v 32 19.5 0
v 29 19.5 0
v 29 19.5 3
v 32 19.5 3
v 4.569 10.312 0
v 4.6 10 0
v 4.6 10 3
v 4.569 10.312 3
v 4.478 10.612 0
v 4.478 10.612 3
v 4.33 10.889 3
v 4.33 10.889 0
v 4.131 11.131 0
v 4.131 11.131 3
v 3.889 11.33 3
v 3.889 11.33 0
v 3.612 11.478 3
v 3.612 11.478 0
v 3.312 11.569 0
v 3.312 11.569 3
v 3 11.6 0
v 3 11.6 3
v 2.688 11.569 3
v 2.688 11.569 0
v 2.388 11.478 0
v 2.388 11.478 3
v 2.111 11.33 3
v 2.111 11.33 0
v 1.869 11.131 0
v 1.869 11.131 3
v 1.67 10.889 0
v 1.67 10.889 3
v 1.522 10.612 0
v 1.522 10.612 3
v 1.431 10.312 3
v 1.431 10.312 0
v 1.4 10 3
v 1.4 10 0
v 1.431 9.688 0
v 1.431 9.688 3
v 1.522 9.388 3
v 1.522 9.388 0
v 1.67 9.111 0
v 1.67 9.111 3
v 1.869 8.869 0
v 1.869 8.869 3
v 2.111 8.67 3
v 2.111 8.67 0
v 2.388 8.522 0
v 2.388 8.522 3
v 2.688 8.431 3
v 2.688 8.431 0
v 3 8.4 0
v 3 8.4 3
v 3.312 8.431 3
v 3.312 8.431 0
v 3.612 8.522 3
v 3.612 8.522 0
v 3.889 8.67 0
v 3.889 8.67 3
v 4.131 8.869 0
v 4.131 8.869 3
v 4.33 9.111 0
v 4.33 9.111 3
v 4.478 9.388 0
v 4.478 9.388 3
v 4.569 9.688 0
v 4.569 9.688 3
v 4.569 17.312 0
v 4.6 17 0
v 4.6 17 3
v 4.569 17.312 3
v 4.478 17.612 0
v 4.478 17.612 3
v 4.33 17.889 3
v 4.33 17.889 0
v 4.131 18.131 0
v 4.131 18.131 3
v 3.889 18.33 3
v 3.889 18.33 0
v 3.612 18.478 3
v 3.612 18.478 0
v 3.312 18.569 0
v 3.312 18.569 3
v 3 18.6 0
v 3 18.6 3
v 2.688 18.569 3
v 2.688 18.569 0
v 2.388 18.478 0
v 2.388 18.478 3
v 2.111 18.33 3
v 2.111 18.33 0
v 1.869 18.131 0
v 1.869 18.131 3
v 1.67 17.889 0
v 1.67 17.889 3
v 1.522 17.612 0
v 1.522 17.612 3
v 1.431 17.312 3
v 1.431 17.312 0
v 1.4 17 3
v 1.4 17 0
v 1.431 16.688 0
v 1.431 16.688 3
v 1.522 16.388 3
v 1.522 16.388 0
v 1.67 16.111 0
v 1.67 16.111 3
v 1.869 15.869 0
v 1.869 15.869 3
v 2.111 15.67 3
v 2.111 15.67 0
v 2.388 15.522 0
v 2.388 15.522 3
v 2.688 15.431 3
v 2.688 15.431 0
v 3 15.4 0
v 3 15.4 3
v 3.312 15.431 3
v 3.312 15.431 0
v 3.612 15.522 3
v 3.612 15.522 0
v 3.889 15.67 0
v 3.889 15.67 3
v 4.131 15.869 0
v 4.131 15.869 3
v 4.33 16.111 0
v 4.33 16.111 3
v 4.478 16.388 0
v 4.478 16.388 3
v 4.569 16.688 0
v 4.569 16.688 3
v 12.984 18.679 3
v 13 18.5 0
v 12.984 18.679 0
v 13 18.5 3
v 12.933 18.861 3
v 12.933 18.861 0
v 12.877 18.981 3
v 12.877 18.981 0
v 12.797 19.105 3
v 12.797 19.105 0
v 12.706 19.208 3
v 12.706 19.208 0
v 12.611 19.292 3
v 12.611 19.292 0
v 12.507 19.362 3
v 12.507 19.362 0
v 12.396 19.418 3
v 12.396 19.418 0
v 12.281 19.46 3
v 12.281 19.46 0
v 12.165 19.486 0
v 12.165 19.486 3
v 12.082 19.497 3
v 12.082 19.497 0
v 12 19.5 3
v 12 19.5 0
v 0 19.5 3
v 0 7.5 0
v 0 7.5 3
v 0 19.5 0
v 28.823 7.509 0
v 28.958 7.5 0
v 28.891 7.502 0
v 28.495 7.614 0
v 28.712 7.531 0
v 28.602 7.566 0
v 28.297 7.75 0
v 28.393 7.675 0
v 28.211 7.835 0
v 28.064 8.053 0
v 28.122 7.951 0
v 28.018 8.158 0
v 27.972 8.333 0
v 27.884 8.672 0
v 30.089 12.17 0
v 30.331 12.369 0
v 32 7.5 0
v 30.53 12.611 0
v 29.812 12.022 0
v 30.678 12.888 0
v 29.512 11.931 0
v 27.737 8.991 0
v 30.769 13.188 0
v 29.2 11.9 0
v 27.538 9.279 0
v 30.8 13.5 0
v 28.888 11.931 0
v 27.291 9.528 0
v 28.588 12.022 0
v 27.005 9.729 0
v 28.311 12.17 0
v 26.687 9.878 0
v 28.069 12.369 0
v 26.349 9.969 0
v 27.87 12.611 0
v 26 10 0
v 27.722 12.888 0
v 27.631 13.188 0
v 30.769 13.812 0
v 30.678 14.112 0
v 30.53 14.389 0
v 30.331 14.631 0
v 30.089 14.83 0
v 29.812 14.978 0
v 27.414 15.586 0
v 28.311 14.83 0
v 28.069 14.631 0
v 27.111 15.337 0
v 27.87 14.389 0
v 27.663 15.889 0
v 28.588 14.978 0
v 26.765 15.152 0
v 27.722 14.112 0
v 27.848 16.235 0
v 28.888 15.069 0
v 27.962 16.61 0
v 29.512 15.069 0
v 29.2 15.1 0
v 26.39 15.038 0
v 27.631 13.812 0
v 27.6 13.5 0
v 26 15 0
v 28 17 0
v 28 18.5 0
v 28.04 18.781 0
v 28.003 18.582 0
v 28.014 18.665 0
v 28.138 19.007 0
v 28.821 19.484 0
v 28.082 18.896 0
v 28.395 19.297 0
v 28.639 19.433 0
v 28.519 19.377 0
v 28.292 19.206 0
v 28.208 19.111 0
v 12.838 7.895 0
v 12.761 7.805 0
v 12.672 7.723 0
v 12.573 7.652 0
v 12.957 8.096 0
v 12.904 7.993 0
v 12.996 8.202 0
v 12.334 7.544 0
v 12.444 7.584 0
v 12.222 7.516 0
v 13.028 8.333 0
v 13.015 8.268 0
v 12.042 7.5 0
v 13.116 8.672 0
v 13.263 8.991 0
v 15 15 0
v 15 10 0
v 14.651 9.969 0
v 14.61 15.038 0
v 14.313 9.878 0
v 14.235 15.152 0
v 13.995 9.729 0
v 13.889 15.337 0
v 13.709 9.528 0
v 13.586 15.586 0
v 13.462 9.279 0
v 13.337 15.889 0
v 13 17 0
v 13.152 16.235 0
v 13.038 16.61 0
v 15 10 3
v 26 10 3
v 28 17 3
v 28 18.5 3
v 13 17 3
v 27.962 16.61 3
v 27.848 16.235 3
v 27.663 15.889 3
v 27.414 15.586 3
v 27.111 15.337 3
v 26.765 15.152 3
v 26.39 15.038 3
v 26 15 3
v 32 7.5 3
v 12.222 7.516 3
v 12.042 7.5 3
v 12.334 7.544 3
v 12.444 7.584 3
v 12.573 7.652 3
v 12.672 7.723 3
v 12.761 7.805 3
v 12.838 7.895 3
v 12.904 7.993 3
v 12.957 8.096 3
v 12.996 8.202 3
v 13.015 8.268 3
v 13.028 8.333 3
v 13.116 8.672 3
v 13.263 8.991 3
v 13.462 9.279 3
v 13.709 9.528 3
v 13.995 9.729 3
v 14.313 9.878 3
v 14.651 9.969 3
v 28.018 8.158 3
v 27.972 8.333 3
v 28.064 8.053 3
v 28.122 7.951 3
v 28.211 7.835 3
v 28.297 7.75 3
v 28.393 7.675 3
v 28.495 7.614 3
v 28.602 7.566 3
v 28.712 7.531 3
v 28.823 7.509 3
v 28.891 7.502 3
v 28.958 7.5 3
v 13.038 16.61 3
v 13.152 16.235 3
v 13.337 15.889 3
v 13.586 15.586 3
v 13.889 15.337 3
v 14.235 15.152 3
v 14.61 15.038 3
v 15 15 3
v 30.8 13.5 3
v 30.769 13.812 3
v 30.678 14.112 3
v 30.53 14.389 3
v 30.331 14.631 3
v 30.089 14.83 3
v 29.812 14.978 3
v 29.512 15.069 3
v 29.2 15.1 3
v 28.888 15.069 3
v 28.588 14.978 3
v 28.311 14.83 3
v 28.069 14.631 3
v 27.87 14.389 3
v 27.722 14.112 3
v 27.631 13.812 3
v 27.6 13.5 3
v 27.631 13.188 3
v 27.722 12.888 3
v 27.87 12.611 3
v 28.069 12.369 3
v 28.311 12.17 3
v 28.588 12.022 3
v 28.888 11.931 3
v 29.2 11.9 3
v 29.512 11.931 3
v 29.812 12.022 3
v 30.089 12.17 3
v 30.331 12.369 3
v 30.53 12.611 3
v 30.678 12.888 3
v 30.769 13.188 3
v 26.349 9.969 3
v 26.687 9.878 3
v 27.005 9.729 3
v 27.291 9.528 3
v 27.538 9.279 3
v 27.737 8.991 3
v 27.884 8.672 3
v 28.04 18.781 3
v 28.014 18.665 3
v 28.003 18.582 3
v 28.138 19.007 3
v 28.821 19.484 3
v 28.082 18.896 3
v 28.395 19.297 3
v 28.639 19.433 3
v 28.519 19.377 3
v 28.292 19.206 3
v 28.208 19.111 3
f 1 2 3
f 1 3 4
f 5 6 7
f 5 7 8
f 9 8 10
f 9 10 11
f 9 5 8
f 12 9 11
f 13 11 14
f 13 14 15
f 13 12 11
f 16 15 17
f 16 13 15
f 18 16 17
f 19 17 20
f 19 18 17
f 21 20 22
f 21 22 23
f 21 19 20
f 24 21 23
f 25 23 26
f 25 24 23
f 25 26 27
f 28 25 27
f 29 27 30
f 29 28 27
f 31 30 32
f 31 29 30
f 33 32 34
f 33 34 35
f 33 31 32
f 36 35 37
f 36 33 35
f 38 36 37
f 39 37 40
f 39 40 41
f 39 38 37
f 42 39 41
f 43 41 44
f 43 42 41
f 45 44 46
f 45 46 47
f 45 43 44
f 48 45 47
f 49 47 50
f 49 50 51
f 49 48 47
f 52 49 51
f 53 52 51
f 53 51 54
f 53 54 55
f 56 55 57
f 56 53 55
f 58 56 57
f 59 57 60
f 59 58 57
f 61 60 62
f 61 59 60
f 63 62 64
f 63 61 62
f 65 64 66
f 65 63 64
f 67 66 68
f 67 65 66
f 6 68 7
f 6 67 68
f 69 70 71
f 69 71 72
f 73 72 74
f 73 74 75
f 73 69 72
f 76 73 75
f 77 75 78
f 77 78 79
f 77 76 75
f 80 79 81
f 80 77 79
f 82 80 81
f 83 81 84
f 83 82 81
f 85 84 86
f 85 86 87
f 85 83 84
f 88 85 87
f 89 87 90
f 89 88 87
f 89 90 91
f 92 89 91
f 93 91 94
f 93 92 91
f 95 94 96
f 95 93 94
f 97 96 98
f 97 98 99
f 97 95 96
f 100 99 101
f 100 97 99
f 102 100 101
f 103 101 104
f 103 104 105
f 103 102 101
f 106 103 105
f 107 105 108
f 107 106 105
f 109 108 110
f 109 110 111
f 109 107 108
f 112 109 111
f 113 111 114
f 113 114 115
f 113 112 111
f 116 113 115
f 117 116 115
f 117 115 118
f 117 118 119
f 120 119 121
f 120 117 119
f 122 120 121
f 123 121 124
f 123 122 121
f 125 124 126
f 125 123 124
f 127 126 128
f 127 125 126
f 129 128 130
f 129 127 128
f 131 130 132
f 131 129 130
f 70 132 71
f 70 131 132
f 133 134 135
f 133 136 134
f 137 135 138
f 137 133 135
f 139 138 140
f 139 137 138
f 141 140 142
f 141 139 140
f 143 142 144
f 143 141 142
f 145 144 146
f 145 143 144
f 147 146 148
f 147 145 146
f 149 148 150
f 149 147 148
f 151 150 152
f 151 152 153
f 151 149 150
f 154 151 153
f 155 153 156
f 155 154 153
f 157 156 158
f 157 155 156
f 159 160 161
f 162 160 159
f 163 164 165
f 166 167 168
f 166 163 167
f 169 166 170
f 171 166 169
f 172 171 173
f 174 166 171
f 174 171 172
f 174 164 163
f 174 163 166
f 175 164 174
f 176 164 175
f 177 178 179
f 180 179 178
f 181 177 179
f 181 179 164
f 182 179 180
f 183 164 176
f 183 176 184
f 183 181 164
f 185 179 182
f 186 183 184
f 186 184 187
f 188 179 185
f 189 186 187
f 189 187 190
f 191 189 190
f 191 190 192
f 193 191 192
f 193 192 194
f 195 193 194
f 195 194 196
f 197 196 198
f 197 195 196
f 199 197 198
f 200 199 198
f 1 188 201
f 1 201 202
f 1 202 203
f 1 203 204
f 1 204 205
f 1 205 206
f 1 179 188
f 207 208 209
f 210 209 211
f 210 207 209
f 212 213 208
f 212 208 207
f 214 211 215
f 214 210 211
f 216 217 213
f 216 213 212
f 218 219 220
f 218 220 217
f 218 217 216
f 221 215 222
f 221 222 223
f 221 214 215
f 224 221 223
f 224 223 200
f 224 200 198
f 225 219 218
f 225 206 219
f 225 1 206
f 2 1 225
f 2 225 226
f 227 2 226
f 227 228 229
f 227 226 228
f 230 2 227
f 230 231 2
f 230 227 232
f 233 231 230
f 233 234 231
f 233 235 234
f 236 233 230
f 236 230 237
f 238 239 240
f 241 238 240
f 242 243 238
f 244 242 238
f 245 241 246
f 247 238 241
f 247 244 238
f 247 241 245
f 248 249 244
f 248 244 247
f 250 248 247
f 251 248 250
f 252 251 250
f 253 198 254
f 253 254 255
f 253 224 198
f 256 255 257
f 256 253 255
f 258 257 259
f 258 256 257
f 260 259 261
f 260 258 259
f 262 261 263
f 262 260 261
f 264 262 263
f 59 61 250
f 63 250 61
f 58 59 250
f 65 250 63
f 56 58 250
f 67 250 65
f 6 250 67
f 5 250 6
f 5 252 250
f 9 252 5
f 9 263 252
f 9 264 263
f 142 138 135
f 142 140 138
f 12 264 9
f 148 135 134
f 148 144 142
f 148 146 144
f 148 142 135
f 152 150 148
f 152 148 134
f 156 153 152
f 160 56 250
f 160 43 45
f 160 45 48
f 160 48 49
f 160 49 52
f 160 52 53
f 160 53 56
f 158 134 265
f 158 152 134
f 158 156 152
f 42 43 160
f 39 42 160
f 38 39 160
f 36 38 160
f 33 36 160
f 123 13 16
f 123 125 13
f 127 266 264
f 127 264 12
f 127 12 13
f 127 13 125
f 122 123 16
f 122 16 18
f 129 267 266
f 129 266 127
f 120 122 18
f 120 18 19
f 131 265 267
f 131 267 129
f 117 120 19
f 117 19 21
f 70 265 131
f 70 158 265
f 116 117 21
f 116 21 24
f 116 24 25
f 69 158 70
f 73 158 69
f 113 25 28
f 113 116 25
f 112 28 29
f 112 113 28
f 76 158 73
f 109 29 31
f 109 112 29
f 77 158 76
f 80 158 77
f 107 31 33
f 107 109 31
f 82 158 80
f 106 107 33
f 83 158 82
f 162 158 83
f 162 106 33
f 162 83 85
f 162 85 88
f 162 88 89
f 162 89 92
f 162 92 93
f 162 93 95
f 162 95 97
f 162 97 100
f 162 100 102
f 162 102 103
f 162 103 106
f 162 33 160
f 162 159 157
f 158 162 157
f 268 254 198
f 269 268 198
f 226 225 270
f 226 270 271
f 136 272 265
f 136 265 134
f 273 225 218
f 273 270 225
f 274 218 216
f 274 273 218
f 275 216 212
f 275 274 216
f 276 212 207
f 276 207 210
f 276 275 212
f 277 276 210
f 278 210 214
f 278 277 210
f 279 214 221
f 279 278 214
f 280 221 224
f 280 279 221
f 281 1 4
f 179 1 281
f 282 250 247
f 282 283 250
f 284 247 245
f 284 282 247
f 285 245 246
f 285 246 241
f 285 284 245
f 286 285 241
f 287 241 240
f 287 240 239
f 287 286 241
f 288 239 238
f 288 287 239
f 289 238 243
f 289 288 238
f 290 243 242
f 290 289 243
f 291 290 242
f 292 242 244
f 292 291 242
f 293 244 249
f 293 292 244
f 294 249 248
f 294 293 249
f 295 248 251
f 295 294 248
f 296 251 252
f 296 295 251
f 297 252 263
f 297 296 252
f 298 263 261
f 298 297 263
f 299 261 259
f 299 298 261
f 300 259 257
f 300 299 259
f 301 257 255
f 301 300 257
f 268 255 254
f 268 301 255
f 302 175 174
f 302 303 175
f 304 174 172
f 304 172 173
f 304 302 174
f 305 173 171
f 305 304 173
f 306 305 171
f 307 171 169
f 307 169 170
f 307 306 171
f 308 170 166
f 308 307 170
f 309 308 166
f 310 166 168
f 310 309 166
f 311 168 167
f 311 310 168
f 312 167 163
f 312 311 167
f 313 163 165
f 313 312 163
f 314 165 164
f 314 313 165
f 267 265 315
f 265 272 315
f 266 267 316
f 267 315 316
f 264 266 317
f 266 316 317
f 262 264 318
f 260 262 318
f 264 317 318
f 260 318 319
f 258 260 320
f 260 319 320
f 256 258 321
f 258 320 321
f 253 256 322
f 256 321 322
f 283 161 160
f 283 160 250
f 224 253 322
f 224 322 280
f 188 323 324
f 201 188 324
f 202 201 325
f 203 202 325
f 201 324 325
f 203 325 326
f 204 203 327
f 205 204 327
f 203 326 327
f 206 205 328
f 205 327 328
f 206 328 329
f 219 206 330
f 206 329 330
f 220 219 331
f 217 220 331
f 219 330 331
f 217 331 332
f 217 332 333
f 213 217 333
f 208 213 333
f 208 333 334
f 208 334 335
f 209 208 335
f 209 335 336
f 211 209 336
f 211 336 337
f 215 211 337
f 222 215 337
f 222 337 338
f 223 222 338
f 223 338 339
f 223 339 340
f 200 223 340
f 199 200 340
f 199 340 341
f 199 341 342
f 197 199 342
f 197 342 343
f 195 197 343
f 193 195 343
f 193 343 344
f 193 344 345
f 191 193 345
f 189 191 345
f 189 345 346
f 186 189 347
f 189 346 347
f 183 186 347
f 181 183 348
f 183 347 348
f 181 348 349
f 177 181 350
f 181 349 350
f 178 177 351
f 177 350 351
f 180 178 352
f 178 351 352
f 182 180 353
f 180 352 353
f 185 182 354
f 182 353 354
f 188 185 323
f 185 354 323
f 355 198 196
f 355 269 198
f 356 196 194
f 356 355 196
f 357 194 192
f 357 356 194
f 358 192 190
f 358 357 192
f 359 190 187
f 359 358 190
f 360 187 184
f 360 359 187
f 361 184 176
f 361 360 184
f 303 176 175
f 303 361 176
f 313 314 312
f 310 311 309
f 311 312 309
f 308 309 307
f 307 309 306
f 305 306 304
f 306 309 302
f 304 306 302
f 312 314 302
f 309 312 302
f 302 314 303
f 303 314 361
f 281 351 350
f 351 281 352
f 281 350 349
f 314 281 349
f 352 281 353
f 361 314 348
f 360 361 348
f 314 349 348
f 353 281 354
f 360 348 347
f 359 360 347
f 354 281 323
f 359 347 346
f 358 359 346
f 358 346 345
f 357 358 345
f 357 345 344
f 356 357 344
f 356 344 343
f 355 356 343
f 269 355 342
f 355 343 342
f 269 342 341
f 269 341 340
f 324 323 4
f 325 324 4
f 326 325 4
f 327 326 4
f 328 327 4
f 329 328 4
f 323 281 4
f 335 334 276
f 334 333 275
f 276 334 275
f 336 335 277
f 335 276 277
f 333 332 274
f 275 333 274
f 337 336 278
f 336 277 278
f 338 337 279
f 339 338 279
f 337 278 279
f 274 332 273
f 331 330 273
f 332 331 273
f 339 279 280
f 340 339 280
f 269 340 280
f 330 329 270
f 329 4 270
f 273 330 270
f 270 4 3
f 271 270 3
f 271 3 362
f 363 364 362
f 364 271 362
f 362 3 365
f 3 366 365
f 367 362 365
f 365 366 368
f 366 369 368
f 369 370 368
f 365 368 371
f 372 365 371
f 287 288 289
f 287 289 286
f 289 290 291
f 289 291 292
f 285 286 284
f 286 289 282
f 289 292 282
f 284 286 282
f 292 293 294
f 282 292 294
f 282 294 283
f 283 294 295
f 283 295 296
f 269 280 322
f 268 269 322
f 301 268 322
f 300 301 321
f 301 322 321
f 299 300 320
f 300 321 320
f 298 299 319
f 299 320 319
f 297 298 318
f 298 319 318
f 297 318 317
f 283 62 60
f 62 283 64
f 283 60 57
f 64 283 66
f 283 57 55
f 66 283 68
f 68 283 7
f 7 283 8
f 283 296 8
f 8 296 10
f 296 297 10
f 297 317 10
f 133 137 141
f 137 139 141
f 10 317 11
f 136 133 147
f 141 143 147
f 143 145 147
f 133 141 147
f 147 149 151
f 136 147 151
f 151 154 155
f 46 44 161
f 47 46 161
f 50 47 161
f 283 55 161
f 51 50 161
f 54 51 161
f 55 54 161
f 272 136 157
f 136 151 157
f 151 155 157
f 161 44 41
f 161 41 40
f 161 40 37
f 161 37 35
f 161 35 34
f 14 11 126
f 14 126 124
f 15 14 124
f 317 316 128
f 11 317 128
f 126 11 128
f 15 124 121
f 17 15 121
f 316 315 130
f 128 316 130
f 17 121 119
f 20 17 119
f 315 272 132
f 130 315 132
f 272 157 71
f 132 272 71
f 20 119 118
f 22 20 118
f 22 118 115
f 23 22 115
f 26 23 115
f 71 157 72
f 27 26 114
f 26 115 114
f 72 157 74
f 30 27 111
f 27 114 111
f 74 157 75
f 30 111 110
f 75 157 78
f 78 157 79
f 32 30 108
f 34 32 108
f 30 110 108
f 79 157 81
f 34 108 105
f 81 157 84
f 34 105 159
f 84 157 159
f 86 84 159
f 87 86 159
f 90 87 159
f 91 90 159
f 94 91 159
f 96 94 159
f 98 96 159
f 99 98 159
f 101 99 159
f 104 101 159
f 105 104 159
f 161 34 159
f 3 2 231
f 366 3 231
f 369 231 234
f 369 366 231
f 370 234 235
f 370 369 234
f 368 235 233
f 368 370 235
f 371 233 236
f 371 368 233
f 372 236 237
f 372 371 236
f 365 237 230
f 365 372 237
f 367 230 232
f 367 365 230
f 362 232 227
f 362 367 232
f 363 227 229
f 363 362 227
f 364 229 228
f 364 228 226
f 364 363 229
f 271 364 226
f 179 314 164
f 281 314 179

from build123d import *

# Parameters (mm, degrees)
SKETCH_1_R          = 1.6
SKETCH_1_W          = 15
SKETCH_1_H          = 6
EXTRUDE_1_DEPTH     = 3
FILLET_1_R          = 2
FILLET_2_R          = 3
SKETCH_2_R          = 1.6
SKETCH_2_W          = 32
SKETCH_2_H          = 12.112345176
CUT_EXTRUDE_1_DEPTH = 44.829670316
FILLET_3_R          = 1


with BuildPart() as part:
    # 草图1 → 凸台-拉伸1 (new body)
    with BuildSketch(Plane.XY):
        Polygon((0, 0), (0, 26.8), (12, 26.8), (12, 29.8), (22, 29.8), (22, 26.8), (32, 26.8), (32, 0), align=None)
        with Locations((3, 17)):
            Circle(SKETCH_1_R, mode=Mode.SUBTRACT)
        with Locations((3, 10)):
            Circle(SKETCH_1_R, mode=Mode.SUBTRACT)
        with Locations((20.5, 7)):
            Rectangle(SKETCH_1_W, SKETCH_1_H, mode=Mode.SUBTRACT)
        with Locations((20.5, 18)):
            Rectangle(SKETCH_1_W, SKETCH_1_H, mode=Mode.SUBTRACT)
    extrude(amount=EXTRUDE_1_DEPTH)

    # 圆角1
    fillet_1_edges = [part.edges().sort_by_distance(p)[0] for p in [
        (13, 10, 1.5),
        (13, 4, 1.5),
        (28, 4, 1.5),
        (28, 10, 1.5),
        (13, 21, 1.5),
        (13, 15, 1.5),
        (28, 15, 1.5),
        (28, 21, 1.5),
    ]]
    fillet(fillet_1_edges, radius=FILLET_1_R)

    # 圆角2
    fillet_2_edges = [part.edges().sort_by_distance(p)[0] for p in [
        (0, 0, 1.5),
        (32, 0, 1.5),
    ]]
    fillet(fillet_2_edges, radius=FILLET_2_R)

    # 草图2 → 切除-拉伸1 (cut, through all)
    with BuildSketch(Plane.XY.offset(3)):
        with Locations((29.2, 13.5)):
            Circle(SKETCH_2_R)
        with Locations((16, 25.556172588)):
            Rectangle(SKETCH_2_W, SKETCH_2_H)
        with Locations((16, 1.443827412)):
            Rectangle(SKETCH_2_W, SKETCH_2_H)
    extrude(amount=-CUT_EXTRUDE_1_DEPTH, mode=Mode.SUBTRACT)

    # 圆角3
    fillet_3_edges = [part.edges().sort_by_distance(p)[0] for p in [
        (28, 7.5, 1.5),
        (13, 7.5, 1.5),
        (13.063508327, 19.5, 1.5),
        (27.936491673, 19.5, 1.5),
    ]]
    fillet(fillet_3_edges, radius=FILLET_3_R)


solid = part.part
